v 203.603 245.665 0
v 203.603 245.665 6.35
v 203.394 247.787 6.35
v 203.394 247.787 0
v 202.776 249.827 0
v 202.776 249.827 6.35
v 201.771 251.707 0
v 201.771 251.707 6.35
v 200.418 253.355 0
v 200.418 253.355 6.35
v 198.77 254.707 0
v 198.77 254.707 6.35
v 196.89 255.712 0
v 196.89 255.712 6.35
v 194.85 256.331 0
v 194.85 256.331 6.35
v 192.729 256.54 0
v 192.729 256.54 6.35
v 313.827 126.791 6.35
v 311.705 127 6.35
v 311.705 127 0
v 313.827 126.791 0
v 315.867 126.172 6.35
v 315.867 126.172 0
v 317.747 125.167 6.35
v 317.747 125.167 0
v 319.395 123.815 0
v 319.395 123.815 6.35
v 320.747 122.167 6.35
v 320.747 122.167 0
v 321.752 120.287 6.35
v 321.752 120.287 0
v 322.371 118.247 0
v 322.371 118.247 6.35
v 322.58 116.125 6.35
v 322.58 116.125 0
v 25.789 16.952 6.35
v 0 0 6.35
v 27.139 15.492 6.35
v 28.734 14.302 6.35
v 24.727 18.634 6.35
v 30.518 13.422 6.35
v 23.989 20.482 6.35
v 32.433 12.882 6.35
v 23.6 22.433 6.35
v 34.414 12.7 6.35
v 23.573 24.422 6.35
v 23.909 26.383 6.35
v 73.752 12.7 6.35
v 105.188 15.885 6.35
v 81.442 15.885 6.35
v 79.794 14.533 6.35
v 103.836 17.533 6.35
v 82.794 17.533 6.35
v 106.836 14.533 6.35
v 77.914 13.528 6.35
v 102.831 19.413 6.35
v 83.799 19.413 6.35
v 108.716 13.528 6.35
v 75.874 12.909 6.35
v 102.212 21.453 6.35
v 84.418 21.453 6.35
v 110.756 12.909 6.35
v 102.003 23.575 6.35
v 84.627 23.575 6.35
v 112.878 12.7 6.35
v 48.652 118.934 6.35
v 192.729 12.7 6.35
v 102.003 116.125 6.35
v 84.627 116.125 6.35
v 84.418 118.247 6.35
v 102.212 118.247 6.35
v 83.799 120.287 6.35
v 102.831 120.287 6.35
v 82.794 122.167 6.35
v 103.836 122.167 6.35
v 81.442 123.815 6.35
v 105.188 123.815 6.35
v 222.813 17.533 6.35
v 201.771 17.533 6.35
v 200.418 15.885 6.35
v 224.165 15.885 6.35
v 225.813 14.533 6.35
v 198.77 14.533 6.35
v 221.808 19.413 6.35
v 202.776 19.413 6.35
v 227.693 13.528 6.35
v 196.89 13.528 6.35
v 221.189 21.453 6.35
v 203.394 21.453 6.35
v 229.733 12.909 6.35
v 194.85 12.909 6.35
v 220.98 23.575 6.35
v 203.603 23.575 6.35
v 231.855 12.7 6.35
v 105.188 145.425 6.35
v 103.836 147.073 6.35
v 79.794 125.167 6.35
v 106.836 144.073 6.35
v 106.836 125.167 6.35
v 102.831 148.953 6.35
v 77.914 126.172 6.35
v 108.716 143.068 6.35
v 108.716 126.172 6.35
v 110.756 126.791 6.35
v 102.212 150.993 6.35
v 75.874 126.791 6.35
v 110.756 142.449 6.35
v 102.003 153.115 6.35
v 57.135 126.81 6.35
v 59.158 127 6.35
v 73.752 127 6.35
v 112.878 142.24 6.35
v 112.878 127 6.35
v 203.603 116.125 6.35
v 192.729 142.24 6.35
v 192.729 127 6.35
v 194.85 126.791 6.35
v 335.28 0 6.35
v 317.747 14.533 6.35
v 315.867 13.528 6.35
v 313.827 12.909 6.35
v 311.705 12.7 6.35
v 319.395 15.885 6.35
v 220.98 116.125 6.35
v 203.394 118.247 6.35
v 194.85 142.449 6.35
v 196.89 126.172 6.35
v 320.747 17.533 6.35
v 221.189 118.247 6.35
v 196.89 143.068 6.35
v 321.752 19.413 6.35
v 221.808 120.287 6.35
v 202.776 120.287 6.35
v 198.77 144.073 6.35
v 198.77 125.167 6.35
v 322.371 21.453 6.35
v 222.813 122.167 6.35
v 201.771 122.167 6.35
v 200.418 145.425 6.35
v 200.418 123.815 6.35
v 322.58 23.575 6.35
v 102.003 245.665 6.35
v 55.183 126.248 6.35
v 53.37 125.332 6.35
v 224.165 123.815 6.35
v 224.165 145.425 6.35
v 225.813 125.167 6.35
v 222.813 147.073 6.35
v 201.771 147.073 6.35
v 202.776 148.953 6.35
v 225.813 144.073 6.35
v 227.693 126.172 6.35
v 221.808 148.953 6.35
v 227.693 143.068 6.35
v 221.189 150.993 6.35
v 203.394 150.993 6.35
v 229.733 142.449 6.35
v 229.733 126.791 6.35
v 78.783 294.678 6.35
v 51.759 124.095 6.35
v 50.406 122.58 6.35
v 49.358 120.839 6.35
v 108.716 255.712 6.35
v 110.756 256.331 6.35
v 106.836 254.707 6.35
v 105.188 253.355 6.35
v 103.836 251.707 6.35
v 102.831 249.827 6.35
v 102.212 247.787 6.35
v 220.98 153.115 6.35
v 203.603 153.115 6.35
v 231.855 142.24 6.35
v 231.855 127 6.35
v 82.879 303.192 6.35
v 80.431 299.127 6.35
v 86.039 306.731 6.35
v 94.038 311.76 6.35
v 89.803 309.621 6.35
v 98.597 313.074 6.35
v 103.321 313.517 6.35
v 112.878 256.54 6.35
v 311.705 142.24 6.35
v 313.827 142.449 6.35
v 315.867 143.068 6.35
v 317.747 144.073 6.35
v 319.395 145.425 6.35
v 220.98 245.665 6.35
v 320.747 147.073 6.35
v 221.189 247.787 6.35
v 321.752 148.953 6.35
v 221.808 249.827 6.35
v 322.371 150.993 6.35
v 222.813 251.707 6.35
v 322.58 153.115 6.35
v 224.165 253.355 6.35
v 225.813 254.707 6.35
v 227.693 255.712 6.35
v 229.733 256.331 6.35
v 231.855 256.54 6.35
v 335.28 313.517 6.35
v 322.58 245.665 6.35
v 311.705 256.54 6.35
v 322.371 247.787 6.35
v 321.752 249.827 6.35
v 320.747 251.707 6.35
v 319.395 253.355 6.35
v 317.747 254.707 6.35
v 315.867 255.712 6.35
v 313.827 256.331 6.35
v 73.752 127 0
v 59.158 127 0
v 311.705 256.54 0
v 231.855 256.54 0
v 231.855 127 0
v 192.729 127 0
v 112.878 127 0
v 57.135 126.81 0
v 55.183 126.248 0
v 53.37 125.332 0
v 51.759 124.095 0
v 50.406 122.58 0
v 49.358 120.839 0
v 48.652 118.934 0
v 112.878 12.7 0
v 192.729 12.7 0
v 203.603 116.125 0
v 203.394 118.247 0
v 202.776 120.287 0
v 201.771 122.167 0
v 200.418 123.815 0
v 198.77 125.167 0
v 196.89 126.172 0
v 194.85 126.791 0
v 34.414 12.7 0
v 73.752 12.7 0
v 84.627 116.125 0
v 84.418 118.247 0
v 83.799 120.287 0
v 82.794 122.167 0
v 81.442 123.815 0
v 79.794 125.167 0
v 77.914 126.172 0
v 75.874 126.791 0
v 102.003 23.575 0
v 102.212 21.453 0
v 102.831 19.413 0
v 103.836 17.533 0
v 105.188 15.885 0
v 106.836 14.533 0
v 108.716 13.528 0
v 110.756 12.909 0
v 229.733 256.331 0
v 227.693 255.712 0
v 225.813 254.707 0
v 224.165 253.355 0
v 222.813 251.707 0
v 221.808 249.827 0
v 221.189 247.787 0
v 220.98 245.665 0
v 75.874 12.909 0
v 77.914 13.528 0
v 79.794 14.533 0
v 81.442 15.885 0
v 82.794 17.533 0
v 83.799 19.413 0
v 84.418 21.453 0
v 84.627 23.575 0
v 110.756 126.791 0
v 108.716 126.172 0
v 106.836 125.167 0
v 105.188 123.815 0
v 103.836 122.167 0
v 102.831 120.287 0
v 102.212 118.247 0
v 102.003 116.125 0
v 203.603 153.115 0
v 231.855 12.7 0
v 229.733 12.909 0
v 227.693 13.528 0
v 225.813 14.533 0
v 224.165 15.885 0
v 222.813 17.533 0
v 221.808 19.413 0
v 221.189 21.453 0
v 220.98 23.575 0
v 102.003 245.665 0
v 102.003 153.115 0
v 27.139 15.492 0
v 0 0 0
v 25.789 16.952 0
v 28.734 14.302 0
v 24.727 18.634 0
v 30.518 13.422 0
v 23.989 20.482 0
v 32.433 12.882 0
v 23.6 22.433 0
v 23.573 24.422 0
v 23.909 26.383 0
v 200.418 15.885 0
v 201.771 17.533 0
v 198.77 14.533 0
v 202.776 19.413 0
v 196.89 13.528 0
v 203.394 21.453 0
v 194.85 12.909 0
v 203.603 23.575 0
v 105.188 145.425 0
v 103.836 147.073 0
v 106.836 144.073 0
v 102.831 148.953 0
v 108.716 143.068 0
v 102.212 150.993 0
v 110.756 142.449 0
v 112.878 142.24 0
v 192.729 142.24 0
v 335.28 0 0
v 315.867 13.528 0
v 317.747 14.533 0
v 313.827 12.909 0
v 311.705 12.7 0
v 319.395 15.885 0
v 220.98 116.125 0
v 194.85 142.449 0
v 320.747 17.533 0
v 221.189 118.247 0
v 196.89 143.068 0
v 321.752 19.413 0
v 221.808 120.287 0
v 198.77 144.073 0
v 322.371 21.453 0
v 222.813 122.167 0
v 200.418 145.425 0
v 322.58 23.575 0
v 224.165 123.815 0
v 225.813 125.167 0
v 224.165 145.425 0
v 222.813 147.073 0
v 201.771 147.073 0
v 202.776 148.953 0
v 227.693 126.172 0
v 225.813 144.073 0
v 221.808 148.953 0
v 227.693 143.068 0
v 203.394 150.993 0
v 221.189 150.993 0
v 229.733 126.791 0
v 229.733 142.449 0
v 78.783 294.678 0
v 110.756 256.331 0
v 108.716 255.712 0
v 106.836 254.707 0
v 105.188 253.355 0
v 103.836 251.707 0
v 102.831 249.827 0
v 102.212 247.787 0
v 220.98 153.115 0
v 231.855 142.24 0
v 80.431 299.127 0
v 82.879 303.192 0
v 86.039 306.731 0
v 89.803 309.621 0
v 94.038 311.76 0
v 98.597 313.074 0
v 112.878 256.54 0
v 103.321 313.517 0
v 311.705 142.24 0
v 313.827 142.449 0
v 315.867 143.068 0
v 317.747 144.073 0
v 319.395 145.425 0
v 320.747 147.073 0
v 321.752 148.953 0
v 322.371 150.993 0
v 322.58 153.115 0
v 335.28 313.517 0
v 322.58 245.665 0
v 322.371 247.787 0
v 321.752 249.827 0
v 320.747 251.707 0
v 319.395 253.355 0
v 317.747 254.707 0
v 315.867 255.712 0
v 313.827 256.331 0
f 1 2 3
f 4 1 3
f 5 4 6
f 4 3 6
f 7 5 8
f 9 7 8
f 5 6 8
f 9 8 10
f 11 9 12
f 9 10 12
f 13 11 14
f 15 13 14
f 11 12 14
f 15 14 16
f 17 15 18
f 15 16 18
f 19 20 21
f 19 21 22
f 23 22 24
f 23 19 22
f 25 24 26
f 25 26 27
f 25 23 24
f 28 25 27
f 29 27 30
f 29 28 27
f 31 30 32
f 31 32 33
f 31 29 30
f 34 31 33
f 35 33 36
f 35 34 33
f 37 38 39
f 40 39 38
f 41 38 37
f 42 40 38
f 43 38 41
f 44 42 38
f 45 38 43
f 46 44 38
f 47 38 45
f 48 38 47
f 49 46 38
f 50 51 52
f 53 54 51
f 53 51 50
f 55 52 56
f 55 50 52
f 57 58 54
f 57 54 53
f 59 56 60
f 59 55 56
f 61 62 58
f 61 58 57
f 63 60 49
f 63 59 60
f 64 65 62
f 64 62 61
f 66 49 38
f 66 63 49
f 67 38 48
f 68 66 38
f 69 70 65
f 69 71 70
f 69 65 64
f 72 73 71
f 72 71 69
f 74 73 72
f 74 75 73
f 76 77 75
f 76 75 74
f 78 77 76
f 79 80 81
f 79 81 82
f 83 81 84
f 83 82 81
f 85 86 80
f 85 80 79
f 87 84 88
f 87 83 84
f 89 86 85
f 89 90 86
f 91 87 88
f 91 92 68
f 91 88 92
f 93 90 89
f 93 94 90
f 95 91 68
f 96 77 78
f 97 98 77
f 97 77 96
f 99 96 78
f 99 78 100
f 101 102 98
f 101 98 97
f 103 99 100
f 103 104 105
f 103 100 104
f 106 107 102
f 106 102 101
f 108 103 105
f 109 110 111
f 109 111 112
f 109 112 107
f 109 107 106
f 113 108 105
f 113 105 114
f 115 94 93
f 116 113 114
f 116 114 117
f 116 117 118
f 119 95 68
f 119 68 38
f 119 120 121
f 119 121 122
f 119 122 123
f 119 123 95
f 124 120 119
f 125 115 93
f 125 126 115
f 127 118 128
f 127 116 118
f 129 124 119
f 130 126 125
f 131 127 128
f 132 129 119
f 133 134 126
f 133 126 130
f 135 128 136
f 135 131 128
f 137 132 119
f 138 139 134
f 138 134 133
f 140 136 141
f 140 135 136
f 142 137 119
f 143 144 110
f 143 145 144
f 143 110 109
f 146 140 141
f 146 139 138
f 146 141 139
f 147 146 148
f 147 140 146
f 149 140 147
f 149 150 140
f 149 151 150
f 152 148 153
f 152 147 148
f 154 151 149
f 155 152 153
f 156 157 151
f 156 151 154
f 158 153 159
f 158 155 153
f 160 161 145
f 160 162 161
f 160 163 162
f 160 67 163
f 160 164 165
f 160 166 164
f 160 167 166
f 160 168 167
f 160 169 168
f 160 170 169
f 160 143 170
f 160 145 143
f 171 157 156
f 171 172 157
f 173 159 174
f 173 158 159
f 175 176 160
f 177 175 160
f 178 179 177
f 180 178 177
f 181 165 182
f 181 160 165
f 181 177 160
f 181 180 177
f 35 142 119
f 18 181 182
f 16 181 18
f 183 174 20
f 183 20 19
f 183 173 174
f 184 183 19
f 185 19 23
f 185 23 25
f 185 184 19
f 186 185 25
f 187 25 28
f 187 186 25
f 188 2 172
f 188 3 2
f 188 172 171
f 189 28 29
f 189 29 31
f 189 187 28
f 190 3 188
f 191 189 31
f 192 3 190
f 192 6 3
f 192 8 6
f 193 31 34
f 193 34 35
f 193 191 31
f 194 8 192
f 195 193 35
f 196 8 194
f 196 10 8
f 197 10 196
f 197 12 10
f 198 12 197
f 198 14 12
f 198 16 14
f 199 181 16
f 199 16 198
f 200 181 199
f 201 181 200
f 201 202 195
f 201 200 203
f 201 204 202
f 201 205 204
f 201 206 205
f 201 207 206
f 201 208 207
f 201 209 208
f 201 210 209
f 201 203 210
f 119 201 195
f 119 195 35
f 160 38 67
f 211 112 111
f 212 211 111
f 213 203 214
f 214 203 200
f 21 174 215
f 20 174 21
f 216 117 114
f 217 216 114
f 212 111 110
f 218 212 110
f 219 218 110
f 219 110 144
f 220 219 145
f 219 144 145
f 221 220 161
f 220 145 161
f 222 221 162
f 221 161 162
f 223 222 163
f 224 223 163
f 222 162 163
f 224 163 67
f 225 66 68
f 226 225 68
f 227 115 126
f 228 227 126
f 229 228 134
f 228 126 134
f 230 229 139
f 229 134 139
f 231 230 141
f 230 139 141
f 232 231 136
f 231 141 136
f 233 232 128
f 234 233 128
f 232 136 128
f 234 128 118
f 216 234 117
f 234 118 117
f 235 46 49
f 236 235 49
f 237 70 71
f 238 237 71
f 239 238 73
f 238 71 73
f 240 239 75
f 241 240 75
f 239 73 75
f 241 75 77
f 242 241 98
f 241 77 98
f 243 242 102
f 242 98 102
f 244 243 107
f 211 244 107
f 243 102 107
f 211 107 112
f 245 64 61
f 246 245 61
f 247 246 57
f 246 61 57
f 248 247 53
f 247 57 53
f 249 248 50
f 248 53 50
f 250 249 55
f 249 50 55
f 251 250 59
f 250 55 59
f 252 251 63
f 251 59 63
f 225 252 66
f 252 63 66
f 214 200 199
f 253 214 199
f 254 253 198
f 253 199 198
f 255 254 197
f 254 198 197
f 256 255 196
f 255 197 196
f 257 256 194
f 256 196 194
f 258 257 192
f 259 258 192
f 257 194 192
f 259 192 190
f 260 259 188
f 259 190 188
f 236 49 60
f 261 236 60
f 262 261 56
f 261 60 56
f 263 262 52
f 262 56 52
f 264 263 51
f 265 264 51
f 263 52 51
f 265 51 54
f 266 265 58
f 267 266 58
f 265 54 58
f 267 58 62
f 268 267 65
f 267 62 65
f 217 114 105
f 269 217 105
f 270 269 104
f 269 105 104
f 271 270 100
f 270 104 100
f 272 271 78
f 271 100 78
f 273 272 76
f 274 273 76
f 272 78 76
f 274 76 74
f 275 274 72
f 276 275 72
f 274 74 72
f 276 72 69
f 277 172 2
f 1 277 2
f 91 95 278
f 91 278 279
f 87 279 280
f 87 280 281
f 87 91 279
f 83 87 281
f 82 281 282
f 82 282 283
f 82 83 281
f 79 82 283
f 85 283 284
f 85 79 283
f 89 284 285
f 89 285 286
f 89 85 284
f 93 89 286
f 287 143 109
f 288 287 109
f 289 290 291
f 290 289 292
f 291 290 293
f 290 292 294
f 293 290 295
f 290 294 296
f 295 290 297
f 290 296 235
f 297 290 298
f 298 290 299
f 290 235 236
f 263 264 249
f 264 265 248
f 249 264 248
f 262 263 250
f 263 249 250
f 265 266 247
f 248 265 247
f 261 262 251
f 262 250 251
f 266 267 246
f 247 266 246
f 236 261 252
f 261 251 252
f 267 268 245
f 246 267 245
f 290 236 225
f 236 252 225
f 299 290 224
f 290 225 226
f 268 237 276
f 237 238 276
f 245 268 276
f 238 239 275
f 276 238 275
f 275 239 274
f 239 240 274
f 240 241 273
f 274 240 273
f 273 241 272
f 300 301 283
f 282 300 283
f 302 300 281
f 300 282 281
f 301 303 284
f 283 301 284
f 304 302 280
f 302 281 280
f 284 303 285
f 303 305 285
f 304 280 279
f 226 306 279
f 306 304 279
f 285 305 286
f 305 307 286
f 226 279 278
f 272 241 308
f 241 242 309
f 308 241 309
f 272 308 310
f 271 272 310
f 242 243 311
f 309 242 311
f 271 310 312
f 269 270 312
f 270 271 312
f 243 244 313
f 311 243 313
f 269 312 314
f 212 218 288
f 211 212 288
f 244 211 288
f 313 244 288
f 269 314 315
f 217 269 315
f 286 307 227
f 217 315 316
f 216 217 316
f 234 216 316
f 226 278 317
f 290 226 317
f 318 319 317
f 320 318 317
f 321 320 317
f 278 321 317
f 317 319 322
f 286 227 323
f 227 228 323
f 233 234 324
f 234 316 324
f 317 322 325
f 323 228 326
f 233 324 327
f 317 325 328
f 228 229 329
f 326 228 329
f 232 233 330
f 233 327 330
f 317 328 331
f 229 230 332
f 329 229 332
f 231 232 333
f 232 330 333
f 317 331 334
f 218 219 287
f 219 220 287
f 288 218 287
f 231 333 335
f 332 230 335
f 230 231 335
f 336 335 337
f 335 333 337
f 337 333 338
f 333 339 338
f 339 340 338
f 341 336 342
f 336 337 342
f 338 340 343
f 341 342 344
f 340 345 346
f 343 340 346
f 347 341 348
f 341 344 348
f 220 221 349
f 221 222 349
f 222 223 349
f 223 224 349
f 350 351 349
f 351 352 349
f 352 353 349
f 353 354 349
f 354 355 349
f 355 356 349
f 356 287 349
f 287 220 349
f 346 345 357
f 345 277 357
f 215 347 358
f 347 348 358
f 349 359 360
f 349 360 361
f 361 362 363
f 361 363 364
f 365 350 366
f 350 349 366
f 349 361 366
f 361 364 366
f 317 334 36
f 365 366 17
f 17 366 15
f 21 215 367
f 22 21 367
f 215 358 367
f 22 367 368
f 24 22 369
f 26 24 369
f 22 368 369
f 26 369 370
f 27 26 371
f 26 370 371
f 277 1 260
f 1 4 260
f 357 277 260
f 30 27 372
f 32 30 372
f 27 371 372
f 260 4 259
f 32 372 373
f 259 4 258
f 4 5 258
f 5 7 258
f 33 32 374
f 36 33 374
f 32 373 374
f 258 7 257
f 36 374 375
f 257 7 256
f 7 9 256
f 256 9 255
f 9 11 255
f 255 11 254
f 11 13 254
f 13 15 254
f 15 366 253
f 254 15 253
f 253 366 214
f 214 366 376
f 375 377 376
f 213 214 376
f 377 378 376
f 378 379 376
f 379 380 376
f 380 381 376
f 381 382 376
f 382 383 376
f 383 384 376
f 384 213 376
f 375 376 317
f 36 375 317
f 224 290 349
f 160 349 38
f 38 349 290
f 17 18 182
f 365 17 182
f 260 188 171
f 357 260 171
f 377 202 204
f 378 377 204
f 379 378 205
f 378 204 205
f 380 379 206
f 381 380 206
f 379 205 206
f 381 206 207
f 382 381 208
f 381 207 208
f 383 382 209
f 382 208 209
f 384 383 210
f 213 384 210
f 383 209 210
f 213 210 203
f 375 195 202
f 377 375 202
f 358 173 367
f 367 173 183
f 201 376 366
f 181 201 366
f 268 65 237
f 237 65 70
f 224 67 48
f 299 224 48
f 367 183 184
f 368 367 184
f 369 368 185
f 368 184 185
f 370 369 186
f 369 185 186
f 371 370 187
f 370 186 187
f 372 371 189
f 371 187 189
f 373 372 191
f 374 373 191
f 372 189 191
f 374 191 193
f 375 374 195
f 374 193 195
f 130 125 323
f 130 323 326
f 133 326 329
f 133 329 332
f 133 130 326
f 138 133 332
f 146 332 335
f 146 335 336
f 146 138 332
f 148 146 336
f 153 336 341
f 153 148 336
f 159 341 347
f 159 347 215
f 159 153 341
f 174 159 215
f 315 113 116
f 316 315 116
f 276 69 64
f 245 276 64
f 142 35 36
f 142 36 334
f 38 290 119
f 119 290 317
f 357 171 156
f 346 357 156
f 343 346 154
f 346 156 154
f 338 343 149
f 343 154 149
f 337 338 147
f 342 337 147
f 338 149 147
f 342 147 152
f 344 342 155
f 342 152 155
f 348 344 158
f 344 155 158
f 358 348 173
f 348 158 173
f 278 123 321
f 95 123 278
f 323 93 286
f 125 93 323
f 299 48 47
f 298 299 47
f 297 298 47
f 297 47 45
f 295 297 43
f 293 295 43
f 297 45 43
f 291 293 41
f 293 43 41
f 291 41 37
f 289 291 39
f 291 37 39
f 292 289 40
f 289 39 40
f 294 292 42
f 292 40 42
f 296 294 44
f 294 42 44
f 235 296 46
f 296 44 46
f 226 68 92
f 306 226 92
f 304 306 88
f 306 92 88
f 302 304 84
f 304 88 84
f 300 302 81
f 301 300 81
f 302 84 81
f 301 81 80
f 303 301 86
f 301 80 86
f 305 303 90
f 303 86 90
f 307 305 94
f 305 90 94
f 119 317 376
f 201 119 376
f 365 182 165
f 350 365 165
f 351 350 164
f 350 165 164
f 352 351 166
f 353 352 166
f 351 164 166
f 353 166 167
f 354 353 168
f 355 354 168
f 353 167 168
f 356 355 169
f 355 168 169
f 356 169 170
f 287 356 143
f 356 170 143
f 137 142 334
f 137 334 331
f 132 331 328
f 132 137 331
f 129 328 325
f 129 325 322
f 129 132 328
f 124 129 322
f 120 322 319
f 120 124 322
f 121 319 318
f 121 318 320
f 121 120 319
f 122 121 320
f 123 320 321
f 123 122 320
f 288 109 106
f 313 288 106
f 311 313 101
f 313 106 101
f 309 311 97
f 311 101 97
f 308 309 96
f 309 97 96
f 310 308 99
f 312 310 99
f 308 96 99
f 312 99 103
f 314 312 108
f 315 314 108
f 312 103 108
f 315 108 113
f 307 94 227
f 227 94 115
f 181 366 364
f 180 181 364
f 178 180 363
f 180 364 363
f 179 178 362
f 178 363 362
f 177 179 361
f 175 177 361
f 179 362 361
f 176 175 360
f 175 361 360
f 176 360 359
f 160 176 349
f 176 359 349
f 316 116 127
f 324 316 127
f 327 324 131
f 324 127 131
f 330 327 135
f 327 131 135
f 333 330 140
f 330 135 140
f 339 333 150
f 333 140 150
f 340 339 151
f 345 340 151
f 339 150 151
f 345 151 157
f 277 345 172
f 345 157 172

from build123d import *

# Parameters (mm, degrees)
BOSS_EXTRUDE1_DEPTH = 6.35
CUT_EXTRUDE1_DEPTH  = 6.35


with BuildPart() as part:
    # Sketch1 → Boss-Extrude1 (new body)
    with BuildSketch(Plane.XY):
        with BuildLine():
            Line((0, 0), (335.28, 0))
            Line((335.28, 0), (335.28, 313.51728))
            Line((335.28, 313.51728), (103.321320582, 313.51728))
            ThreePointArc((103.321320582, 313.51728), (87.853181888, 308.264157806), (78.783155215, 294.677648925))
            Line((78.783155215, 294.677648925), (0, 0))
        make_face()
    extrude(amount=BOSS_EXTRUDE1_DEPTH)

    # Sketch2 → Cut-Extrude1 (cut)
    with BuildSketch(Plane.XY.offset(6.35)):
        with BuildLine():
            Line((311.705446202, 12.7), (231.854553798, 12.7))
            ThreePointArc((231.854553798, 12.7), (224.165083065, 15.885083065), (220.98, 23.574553798))
            Line((220.98, 23.574553798), (220.98, 116.125446202))
            ThreePointArc((220.98, 116.125446202), (224.165083065, 123.814916935), (231.854553798, 127))
            Line((231.854553798, 127), (311.705446202, 127))
            ThreePointArc((311.705446202, 127), (319.394916935, 123.814916935), (322.58, 116.125446202))
            Line((322.58, 116.125446202), (322.58, 23.574553798))
            ThreePointArc((322.58, 23.574553798), (319.394916935, 15.885083065), (311.705446202, 12.7))
        make_face()
        with BuildLine():
            Line((203.603317785, 23.574553798), (203.603317785, 116.125446202))
            ThreePointArc((203.603317785, 116.125446202), (200.41823472, 123.814916935), (192.728763987, 127))
            Line((192.728763987, 127), (112.877871584, 127))
            ThreePointArc((112.877871584, 127), (105.18840085, 123.814916935), (102.003317785, 116.125446202))
            Line((102.003317785, 116.125446202), (102.003317785, 23.574553798))
            ThreePointArc((102.003317785, 23.574553798), (105.18840085, 15.885083065), (112.877871584, 12.7))
            Line((112.877871584, 12.7), (192.728763987, 12.7))
            ThreePointArc((192.728763987, 12.7), (200.41823472, 15.885083065), (203.603317785, 23.574553798))
        make_face()
        with BuildLine():
            Line((84.62663557, 23.574553798), (84.62663557, 116.125446202))
            ThreePointArc((84.62663557, 116.125446202), (81.441552505, 123.814916935), (73.752081772, 127))
            Line((73.752081772, 127), (59.157987156, 127))
            ThreePointArc((59.157987156, 127), (52.535581392, 124.750970083), (48.652412376, 118.934150328))
            Line((48.652412376, 118.934150328), (23.908590277, 26.383257925))
            ThreePointArc((23.908590277, 26.383257925), (25.788641176, 16.952148035), (34.414165057, 12.7))
            Line((34.414165057, 12.7), (73.752081772, 12.7))
            ThreePointArc((73.752081772, 12.7), (81.441552505, 15.885083065), (84.62663557, 23.574553798))
        make_face()
        with BuildLine():
            Line((203.603317785, 153.114553798), (203.603317785, 245.665446202))
            ThreePointArc((203.603317785, 245.665446202), (200.41823472, 253.354916935), (192.728763987, 256.54))
            Line((192.728763987, 256.54), (112.877871584, 256.54))
            ThreePointArc((112.877871584, 256.54), (105.18840085, 253.354916935), (102.003317785, 245.665446202))
            Line((102.003317785, 245.665446202), (102.003317785, 153.114553798))
            ThreePointArc((102.003317785, 153.114553798), (105.18840085, 145.425083065), (112.877871584, 142.24))
            Line((112.877871584, 142.24), (192.728763987, 142.24))
            ThreePointArc((192.728763987, 142.24), (200.41823472, 145.425083065), (203.603317785, 153.114553798))
        make_face()
        with BuildLine():
            Line((322.58, 153.114553798), (322.58, 245.665446202))
            ThreePointArc((322.58, 245.665446202), (319.394916935, 253.354916935), (311.705446202, 256.54))
            Line((311.705446202, 256.54), (231.854553798, 256.54))
            ThreePointArc((231.854553798, 256.54), (224.165083065, 253.354916935), (220.98, 245.665446202))
            Line((220.98, 245.665446202), (220.98, 153.114553798))
            ThreePointArc((220.98, 153.114553798), (224.165083065, 145.425083065), (231.854553798, 142.24))
            Line((231.854553798, 142.24), (311.705446202, 142.24))
            ThreePointArc((311.705446202, 142.24), (319.394916935, 145.425083065), (322.58, 153.114553798))
        make_face()
    extrude(amount=-CUT_EXTRUDE1_DEPTH, mode=Mode.SUBTRACT)


solid = part.part
